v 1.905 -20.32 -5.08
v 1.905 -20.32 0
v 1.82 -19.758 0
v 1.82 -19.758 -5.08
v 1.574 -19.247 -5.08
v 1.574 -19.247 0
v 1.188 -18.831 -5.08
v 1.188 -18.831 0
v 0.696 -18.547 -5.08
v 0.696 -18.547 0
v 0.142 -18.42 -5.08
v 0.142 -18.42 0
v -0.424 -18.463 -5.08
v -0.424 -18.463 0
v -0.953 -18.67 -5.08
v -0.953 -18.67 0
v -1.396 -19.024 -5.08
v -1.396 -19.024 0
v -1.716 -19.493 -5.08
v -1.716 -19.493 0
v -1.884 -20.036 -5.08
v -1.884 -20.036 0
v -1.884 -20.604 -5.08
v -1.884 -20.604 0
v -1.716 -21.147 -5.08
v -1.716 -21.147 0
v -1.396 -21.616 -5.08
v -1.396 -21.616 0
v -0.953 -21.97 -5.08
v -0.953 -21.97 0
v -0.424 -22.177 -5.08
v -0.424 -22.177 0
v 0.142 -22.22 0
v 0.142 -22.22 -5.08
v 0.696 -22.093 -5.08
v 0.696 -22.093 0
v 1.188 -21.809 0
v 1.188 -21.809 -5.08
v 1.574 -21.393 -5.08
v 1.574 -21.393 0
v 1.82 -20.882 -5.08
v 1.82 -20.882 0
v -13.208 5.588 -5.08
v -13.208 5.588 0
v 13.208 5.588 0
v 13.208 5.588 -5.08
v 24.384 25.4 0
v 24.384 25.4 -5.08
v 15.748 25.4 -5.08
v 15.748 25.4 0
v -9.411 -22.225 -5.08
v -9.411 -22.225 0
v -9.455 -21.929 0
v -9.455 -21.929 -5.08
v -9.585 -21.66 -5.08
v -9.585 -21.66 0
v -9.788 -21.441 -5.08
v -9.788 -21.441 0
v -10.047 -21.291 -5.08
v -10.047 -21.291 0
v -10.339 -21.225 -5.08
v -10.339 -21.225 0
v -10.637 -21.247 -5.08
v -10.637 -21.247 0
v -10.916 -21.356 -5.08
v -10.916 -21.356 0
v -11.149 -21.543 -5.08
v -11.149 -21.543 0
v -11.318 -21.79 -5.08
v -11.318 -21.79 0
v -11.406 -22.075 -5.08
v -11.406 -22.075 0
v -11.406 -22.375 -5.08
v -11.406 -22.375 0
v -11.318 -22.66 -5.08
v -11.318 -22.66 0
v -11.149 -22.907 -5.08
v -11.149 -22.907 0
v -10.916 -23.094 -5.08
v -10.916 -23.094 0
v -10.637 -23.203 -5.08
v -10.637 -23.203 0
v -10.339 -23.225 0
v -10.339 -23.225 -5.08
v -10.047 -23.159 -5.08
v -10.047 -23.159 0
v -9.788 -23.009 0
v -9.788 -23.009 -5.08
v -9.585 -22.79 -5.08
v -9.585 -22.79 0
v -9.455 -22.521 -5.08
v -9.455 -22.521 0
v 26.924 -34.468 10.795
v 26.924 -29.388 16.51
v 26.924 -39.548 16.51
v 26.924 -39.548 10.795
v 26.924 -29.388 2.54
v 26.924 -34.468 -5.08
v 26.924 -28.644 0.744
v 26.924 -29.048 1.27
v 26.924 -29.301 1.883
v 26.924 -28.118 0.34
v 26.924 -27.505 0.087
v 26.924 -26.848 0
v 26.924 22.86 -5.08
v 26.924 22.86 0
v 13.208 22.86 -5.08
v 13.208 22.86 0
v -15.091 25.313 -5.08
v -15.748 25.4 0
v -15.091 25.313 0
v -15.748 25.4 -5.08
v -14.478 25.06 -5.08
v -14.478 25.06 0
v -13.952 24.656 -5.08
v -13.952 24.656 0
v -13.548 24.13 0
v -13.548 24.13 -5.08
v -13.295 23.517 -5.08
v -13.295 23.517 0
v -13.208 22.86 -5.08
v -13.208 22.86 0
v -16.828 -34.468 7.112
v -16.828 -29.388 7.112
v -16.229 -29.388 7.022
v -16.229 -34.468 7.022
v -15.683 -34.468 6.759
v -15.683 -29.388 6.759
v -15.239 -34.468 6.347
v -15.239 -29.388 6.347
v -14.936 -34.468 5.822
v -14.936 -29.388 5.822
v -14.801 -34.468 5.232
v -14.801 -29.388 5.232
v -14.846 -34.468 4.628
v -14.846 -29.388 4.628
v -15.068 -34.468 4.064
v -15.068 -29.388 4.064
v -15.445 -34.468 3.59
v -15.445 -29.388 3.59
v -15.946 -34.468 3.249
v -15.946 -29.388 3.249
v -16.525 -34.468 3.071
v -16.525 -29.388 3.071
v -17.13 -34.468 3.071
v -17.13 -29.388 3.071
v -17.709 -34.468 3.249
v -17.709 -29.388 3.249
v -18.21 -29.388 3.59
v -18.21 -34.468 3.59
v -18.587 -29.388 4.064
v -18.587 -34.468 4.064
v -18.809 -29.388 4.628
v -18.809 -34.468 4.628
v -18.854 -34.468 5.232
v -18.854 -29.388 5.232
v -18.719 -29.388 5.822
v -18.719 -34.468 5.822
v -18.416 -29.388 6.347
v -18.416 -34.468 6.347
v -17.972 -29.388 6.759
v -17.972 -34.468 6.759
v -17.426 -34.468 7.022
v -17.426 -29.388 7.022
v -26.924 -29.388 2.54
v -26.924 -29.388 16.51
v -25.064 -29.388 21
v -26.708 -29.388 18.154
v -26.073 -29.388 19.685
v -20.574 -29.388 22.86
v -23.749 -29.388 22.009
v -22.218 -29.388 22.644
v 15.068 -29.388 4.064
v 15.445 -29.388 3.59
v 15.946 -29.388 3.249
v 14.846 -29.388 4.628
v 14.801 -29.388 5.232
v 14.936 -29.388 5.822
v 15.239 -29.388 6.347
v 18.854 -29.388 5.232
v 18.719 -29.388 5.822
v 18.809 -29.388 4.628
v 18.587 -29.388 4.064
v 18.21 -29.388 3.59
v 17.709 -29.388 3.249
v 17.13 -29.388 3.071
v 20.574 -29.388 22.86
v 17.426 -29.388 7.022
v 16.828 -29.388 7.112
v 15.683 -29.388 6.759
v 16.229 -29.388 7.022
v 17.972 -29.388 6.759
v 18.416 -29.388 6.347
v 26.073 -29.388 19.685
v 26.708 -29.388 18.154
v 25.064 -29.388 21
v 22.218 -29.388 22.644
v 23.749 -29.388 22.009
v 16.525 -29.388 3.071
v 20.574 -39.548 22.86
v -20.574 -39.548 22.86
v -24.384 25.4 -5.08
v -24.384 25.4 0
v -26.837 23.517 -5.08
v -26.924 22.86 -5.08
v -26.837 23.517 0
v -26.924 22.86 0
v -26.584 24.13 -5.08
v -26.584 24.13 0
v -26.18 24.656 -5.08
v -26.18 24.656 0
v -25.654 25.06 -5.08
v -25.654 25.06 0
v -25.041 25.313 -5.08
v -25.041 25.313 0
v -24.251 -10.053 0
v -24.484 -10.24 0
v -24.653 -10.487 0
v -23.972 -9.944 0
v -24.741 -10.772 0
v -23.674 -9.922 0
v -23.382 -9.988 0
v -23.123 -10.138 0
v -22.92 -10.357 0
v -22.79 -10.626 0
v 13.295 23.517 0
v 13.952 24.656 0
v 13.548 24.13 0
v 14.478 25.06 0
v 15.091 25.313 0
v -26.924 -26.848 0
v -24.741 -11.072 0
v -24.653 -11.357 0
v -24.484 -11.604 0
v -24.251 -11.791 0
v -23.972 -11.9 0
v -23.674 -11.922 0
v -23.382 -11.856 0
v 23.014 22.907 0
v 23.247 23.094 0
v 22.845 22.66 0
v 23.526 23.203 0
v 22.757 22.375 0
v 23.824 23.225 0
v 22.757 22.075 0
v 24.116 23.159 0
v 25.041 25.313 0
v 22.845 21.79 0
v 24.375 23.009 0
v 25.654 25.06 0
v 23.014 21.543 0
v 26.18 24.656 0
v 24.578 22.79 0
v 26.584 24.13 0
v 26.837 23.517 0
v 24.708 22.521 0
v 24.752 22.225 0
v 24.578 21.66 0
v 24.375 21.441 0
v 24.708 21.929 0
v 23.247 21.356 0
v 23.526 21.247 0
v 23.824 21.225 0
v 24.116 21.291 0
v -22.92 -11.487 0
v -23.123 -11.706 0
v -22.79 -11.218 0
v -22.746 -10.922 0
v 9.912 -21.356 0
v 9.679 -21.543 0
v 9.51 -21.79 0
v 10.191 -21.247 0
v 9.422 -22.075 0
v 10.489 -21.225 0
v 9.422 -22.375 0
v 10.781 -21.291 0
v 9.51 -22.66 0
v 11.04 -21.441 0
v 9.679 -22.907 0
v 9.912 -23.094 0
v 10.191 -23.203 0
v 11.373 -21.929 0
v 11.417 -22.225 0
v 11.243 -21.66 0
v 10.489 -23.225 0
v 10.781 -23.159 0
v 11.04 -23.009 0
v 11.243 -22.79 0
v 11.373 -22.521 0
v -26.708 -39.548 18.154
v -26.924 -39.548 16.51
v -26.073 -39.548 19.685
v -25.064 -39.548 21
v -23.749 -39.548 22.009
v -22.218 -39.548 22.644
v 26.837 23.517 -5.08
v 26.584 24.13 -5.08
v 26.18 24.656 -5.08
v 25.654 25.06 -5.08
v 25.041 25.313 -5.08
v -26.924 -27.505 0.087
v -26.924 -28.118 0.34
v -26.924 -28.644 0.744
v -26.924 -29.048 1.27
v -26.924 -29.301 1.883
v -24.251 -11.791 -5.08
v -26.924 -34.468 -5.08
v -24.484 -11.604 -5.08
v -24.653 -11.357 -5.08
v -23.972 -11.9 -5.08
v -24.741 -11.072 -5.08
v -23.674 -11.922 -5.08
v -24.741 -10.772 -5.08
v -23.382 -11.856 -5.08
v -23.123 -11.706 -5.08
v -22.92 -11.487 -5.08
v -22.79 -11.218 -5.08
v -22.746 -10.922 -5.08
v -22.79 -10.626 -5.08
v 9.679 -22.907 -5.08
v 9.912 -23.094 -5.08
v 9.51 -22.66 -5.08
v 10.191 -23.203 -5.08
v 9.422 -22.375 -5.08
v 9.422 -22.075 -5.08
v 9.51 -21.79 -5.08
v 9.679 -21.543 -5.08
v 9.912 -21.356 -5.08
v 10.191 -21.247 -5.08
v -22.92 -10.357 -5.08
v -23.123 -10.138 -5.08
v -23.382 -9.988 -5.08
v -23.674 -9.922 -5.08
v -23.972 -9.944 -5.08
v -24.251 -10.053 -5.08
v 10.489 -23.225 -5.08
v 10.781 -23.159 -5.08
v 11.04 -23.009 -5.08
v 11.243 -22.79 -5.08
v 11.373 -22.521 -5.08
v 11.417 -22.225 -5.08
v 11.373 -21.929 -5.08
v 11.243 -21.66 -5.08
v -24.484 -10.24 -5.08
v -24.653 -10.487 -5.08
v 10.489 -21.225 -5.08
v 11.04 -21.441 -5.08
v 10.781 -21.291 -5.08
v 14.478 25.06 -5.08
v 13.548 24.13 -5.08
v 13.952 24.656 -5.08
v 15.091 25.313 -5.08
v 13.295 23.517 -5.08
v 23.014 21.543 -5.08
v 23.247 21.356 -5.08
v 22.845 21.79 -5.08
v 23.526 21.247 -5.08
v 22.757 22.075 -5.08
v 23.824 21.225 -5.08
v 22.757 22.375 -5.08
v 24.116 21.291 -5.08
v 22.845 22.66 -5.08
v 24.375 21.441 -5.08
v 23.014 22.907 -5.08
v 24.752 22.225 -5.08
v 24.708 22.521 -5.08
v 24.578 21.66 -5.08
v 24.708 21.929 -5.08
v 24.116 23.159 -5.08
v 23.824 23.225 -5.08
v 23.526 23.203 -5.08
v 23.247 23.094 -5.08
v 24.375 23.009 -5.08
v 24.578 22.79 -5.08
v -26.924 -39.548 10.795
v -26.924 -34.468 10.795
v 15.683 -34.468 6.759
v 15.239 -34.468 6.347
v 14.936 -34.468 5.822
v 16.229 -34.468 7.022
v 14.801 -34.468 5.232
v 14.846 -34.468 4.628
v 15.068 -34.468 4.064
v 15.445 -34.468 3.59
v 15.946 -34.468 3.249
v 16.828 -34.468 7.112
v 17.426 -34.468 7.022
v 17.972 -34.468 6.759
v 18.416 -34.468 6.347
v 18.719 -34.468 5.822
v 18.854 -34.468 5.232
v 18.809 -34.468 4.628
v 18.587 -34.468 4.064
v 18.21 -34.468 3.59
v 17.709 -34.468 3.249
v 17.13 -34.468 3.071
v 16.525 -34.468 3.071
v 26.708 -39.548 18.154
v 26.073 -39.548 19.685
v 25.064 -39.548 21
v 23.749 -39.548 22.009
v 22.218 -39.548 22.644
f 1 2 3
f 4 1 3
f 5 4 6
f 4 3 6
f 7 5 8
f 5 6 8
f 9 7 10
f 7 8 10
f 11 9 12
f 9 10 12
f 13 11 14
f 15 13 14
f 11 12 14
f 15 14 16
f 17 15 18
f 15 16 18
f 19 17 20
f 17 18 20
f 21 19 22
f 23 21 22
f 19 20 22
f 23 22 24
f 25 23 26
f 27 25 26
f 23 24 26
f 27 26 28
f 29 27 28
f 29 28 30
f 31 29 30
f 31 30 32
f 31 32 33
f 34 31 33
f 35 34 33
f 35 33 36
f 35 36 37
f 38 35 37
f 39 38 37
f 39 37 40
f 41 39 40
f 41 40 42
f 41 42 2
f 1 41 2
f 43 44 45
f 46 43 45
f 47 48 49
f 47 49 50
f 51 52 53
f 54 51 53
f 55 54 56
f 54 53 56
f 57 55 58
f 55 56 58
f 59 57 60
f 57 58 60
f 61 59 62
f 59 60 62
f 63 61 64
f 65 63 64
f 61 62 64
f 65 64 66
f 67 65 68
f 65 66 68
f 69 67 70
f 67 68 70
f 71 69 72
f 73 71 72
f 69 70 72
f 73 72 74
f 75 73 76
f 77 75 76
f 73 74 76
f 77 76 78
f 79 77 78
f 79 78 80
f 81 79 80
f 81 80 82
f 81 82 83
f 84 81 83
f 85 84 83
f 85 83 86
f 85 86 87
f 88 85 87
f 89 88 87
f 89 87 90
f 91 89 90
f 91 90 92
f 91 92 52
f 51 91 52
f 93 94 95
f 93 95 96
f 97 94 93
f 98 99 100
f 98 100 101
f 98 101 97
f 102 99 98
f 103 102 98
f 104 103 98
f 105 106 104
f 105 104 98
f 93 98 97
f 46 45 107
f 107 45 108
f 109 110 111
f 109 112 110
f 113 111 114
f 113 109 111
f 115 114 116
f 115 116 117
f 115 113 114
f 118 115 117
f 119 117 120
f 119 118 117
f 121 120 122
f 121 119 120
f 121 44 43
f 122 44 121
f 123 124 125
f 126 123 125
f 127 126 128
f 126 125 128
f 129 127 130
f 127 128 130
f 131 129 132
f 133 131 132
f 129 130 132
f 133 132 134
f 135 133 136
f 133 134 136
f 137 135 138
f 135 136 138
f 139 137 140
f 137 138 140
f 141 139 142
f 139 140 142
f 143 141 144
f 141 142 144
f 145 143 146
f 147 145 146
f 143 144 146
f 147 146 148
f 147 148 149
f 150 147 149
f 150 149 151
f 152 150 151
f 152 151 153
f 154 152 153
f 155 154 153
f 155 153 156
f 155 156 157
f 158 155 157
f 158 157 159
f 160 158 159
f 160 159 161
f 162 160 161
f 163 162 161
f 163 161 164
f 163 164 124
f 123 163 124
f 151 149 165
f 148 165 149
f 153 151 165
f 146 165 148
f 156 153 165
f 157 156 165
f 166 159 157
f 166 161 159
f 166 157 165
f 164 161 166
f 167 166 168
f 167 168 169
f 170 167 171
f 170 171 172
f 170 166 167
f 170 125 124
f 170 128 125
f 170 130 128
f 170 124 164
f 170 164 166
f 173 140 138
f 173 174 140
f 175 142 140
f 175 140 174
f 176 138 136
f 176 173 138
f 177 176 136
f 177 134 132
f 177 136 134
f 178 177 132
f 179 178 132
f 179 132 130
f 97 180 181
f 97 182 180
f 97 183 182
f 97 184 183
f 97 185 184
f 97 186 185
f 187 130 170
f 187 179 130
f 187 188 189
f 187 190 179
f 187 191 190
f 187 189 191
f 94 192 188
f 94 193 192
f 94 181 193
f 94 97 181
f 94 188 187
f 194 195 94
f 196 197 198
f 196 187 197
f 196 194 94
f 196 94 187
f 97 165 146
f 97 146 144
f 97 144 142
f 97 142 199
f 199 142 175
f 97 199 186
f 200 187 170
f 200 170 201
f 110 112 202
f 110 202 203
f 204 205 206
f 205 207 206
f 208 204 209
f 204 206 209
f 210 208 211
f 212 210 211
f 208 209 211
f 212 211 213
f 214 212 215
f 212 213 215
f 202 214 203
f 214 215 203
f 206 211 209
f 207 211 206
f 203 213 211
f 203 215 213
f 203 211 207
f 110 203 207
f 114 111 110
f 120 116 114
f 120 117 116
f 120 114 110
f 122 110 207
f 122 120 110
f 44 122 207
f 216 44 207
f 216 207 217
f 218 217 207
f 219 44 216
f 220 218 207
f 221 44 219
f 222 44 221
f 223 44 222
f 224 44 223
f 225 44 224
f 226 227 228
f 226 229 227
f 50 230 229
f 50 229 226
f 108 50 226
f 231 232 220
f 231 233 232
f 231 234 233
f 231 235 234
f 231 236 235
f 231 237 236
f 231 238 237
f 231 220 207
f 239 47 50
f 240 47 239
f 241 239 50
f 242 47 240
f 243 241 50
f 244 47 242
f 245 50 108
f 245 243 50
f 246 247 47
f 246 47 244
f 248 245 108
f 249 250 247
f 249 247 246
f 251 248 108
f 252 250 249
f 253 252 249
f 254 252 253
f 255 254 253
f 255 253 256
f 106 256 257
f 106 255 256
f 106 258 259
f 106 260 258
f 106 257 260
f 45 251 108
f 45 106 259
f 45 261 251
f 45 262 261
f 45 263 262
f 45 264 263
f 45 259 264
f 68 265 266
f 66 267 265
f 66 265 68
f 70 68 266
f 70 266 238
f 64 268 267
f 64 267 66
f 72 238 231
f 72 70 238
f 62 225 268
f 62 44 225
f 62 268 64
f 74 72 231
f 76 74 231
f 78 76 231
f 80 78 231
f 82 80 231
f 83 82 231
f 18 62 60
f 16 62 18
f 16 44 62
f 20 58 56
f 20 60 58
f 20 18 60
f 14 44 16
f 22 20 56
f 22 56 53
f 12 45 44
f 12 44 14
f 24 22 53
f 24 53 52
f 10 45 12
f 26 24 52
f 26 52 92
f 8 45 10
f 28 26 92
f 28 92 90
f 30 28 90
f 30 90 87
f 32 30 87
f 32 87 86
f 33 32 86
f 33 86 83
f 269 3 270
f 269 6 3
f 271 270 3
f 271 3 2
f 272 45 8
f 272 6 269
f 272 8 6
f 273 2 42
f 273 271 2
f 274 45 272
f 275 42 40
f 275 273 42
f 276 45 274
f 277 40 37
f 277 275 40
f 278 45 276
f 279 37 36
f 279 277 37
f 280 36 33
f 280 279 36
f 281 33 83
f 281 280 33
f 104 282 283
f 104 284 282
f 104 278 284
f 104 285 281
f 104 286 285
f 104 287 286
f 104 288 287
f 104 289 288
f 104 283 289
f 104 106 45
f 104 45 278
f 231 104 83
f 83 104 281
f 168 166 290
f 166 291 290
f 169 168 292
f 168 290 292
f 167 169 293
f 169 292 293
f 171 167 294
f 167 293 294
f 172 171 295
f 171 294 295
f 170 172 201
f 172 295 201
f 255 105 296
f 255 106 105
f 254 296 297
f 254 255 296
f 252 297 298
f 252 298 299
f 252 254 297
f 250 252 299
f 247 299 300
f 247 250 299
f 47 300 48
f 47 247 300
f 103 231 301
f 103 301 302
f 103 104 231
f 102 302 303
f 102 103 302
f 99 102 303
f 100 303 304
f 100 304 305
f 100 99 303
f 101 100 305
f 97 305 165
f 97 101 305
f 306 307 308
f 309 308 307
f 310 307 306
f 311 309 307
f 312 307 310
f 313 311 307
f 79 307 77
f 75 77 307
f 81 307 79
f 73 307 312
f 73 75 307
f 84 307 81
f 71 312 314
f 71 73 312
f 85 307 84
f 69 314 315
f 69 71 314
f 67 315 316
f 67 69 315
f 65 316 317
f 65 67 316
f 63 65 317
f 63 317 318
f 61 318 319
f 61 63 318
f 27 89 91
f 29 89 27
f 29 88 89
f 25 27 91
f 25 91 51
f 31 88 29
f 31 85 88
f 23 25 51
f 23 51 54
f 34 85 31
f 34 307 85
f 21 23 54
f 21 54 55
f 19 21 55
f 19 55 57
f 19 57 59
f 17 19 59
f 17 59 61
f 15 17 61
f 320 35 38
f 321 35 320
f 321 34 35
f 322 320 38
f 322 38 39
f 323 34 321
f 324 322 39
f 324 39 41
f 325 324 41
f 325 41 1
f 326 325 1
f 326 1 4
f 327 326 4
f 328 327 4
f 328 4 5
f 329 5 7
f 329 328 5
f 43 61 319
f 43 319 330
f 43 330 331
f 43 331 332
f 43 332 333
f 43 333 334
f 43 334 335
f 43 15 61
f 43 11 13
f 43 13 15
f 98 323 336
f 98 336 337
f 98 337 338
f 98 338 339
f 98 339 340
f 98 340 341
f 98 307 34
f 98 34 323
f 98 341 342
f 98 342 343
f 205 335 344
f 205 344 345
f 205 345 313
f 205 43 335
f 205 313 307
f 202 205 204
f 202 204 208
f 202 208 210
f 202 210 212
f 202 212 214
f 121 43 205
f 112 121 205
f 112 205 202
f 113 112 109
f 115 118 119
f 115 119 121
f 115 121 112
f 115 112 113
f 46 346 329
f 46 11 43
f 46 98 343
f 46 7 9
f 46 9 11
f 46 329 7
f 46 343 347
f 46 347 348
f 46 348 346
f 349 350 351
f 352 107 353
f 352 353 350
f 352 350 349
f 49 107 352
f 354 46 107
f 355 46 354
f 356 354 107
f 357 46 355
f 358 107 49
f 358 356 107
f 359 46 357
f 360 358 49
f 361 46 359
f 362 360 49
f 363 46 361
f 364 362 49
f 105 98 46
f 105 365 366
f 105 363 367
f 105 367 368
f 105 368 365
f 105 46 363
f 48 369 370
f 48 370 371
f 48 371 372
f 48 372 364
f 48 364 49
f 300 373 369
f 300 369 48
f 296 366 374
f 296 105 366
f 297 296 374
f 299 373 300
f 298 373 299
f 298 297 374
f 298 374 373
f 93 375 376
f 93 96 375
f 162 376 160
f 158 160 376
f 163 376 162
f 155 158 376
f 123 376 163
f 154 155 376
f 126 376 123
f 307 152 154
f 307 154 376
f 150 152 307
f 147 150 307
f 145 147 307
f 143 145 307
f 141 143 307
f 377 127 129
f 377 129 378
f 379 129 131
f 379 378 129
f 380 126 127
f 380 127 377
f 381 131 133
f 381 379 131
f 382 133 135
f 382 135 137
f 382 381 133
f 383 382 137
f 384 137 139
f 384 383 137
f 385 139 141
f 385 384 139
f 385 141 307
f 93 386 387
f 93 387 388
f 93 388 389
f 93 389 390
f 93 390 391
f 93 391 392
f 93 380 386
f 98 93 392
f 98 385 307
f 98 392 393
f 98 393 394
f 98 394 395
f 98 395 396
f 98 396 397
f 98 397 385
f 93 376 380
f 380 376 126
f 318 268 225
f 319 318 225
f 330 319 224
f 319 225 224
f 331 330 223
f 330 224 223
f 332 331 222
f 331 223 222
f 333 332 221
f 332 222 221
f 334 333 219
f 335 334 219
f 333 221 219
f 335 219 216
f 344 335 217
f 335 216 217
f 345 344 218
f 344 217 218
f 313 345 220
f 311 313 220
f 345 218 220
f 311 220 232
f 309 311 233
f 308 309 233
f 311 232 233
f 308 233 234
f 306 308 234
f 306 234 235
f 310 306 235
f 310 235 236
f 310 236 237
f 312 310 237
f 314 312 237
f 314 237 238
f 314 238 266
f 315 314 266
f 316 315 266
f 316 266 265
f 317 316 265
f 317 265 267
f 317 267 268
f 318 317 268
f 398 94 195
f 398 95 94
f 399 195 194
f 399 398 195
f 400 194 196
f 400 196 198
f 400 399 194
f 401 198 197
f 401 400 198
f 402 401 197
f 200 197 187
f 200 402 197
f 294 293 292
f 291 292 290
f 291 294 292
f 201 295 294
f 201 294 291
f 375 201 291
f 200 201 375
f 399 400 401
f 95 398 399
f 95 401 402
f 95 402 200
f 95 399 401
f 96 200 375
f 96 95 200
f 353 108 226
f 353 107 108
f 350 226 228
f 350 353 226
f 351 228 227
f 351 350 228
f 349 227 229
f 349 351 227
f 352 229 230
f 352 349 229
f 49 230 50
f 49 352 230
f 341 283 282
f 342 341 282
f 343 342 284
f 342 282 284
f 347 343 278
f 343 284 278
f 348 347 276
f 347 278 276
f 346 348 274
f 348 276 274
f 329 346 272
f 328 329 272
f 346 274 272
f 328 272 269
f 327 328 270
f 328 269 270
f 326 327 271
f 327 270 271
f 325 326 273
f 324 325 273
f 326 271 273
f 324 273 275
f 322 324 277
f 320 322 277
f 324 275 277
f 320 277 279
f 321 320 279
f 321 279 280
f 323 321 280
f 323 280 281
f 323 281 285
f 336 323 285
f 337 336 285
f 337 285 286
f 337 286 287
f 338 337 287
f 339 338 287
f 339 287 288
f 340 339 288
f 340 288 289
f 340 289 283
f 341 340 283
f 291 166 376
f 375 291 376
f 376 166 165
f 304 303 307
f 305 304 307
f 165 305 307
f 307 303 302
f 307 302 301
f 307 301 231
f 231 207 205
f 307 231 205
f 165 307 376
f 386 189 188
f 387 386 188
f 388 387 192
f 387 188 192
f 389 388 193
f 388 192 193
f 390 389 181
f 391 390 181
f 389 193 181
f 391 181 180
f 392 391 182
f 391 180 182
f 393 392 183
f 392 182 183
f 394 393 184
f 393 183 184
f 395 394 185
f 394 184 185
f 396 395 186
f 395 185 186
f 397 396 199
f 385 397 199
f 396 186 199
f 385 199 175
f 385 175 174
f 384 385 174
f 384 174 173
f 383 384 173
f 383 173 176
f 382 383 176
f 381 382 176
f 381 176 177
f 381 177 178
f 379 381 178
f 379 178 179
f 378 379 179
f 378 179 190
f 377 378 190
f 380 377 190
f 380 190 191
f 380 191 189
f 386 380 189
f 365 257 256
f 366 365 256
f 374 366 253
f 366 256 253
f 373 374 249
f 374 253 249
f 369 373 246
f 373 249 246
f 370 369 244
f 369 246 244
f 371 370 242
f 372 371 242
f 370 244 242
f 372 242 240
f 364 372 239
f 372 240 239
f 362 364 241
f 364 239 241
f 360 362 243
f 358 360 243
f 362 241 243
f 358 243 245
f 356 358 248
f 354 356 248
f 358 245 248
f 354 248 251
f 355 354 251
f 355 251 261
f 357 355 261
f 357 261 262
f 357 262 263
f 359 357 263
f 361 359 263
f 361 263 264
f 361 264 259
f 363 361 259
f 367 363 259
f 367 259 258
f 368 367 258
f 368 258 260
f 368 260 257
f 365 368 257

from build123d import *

# Parameters (mm, degrees)
BOSS_EXTRUDE1_DEPTH = 26.924
SKETCH2_R           = 1.0033
SKETCH2_R_2         = 1.905
CUT_EXTRUDE1_DEPTH  = 51.308
SKETCH3_W           = 26.416
SKETCH3_H           = 19.812
CUT_EXTRUDE2_DEPTH  = 5.08
FILLET1_R           = 6.35
FILLET2_R           = 2.54
FILLET3_R           = 2.54
SKETCH4_R           = 2.032
CUT_EXTRUDE3_DEPTH  = 66.185768423


with BuildPart() as part:
    # Sketch1 → Boss-Extrude1 (new, symmetric)
    with BuildSketch(Plane(origin=(0, 0, 0), x_dir=(0, 0, -1), z_dir=(1, 0, 0))):
        Polygon((-10.795, -34.4678), (5.08, -34.4678), (5.08, 25.4), (0, 25.4), (0, -29.3878), (-22.86, -29.3878), (-22.86, -39.5478), (-10.795, -39.5478), align=None)
    extrude(amount=BOSS_EXTRUDE1_DEPTH, both=True)

    # Sketch2 → Cut-Extrude1 (cut)
    with BuildSketch(Plane.XY):
        with Locations((23.749, 22.225)):
            Circle(SKETCH2_R)
        with Locations((-10.414, -22.225)):
            Circle(SKETCH2_R)
        with Locations((10.414, -22.225)):
            Circle(SKETCH2_R)
        with Locations((0, -20.32)):
            Circle(SKETCH2_R_2)
        with Locations((-23.749, -10.922)):
            Circle(SKETCH2_R)
    extrude(amount=-CUT_EXTRUDE1_DEPTH, mode=Mode.SUBTRACT)

    # Sketch3 → Cut-Extrude2 (cut)
    with BuildSketch(Plane.XY):
        with Locations((0, 15.494)):
            Rectangle(SKETCH3_W, SKETCH3_H)
    extrude(amount=-CUT_EXTRUDE2_DEPTH, mode=Mode.SUBTRACT)

    # Fillet1
    fillet1_edges = [part.edges().sort_by_distance(p)[0] for p in [
        (26.924, -34.4678, 22.86),
        (-26.924, -34.4678, 22.86),
    ]]
    fillet(fillet1_edges, radius=FILLET1_R)

    # Fillet2
    fillet2_edges = [part.edges().sort_by_distance(p)[0] for p in [
        (26.924, 25.4, -2.54),
        (-13.208, 25.4, -2.54),
        (13.208, 25.4, -2.54),
        (-26.924, 25.4, -2.54),
    ]]
    fillet(fillet2_edges, radius=FILLET2_R)

    # Fillet3
    fillet3_edges = [part.edges().sort_by_distance(p)[0] for p in [
        (0, -29.3878, 0),
    ]]
    fillet(fillet3_edges, radius=FILLET3_R)

    # Sketch4 → Cut-Extrude3 (cut, through all)
    with BuildSketch(Plane(origin=(0, -29.3878, 0), x_dir=(1, 0, 0), z_dir=(0, 1, 0))):
        with Locations(Location((-16.8275, -5.08, 0), (0, 0, 270))):
            Circle(SKETCH4_R)
        with Locations(Location((16.8275, -5.08, 0), (0, 0, 270))):
            Circle(SKETCH4_R)
    extrude(amount=-CUT_EXTRUDE3_DEPTH, mode=Mode.SUBTRACT)


solid = part.part
